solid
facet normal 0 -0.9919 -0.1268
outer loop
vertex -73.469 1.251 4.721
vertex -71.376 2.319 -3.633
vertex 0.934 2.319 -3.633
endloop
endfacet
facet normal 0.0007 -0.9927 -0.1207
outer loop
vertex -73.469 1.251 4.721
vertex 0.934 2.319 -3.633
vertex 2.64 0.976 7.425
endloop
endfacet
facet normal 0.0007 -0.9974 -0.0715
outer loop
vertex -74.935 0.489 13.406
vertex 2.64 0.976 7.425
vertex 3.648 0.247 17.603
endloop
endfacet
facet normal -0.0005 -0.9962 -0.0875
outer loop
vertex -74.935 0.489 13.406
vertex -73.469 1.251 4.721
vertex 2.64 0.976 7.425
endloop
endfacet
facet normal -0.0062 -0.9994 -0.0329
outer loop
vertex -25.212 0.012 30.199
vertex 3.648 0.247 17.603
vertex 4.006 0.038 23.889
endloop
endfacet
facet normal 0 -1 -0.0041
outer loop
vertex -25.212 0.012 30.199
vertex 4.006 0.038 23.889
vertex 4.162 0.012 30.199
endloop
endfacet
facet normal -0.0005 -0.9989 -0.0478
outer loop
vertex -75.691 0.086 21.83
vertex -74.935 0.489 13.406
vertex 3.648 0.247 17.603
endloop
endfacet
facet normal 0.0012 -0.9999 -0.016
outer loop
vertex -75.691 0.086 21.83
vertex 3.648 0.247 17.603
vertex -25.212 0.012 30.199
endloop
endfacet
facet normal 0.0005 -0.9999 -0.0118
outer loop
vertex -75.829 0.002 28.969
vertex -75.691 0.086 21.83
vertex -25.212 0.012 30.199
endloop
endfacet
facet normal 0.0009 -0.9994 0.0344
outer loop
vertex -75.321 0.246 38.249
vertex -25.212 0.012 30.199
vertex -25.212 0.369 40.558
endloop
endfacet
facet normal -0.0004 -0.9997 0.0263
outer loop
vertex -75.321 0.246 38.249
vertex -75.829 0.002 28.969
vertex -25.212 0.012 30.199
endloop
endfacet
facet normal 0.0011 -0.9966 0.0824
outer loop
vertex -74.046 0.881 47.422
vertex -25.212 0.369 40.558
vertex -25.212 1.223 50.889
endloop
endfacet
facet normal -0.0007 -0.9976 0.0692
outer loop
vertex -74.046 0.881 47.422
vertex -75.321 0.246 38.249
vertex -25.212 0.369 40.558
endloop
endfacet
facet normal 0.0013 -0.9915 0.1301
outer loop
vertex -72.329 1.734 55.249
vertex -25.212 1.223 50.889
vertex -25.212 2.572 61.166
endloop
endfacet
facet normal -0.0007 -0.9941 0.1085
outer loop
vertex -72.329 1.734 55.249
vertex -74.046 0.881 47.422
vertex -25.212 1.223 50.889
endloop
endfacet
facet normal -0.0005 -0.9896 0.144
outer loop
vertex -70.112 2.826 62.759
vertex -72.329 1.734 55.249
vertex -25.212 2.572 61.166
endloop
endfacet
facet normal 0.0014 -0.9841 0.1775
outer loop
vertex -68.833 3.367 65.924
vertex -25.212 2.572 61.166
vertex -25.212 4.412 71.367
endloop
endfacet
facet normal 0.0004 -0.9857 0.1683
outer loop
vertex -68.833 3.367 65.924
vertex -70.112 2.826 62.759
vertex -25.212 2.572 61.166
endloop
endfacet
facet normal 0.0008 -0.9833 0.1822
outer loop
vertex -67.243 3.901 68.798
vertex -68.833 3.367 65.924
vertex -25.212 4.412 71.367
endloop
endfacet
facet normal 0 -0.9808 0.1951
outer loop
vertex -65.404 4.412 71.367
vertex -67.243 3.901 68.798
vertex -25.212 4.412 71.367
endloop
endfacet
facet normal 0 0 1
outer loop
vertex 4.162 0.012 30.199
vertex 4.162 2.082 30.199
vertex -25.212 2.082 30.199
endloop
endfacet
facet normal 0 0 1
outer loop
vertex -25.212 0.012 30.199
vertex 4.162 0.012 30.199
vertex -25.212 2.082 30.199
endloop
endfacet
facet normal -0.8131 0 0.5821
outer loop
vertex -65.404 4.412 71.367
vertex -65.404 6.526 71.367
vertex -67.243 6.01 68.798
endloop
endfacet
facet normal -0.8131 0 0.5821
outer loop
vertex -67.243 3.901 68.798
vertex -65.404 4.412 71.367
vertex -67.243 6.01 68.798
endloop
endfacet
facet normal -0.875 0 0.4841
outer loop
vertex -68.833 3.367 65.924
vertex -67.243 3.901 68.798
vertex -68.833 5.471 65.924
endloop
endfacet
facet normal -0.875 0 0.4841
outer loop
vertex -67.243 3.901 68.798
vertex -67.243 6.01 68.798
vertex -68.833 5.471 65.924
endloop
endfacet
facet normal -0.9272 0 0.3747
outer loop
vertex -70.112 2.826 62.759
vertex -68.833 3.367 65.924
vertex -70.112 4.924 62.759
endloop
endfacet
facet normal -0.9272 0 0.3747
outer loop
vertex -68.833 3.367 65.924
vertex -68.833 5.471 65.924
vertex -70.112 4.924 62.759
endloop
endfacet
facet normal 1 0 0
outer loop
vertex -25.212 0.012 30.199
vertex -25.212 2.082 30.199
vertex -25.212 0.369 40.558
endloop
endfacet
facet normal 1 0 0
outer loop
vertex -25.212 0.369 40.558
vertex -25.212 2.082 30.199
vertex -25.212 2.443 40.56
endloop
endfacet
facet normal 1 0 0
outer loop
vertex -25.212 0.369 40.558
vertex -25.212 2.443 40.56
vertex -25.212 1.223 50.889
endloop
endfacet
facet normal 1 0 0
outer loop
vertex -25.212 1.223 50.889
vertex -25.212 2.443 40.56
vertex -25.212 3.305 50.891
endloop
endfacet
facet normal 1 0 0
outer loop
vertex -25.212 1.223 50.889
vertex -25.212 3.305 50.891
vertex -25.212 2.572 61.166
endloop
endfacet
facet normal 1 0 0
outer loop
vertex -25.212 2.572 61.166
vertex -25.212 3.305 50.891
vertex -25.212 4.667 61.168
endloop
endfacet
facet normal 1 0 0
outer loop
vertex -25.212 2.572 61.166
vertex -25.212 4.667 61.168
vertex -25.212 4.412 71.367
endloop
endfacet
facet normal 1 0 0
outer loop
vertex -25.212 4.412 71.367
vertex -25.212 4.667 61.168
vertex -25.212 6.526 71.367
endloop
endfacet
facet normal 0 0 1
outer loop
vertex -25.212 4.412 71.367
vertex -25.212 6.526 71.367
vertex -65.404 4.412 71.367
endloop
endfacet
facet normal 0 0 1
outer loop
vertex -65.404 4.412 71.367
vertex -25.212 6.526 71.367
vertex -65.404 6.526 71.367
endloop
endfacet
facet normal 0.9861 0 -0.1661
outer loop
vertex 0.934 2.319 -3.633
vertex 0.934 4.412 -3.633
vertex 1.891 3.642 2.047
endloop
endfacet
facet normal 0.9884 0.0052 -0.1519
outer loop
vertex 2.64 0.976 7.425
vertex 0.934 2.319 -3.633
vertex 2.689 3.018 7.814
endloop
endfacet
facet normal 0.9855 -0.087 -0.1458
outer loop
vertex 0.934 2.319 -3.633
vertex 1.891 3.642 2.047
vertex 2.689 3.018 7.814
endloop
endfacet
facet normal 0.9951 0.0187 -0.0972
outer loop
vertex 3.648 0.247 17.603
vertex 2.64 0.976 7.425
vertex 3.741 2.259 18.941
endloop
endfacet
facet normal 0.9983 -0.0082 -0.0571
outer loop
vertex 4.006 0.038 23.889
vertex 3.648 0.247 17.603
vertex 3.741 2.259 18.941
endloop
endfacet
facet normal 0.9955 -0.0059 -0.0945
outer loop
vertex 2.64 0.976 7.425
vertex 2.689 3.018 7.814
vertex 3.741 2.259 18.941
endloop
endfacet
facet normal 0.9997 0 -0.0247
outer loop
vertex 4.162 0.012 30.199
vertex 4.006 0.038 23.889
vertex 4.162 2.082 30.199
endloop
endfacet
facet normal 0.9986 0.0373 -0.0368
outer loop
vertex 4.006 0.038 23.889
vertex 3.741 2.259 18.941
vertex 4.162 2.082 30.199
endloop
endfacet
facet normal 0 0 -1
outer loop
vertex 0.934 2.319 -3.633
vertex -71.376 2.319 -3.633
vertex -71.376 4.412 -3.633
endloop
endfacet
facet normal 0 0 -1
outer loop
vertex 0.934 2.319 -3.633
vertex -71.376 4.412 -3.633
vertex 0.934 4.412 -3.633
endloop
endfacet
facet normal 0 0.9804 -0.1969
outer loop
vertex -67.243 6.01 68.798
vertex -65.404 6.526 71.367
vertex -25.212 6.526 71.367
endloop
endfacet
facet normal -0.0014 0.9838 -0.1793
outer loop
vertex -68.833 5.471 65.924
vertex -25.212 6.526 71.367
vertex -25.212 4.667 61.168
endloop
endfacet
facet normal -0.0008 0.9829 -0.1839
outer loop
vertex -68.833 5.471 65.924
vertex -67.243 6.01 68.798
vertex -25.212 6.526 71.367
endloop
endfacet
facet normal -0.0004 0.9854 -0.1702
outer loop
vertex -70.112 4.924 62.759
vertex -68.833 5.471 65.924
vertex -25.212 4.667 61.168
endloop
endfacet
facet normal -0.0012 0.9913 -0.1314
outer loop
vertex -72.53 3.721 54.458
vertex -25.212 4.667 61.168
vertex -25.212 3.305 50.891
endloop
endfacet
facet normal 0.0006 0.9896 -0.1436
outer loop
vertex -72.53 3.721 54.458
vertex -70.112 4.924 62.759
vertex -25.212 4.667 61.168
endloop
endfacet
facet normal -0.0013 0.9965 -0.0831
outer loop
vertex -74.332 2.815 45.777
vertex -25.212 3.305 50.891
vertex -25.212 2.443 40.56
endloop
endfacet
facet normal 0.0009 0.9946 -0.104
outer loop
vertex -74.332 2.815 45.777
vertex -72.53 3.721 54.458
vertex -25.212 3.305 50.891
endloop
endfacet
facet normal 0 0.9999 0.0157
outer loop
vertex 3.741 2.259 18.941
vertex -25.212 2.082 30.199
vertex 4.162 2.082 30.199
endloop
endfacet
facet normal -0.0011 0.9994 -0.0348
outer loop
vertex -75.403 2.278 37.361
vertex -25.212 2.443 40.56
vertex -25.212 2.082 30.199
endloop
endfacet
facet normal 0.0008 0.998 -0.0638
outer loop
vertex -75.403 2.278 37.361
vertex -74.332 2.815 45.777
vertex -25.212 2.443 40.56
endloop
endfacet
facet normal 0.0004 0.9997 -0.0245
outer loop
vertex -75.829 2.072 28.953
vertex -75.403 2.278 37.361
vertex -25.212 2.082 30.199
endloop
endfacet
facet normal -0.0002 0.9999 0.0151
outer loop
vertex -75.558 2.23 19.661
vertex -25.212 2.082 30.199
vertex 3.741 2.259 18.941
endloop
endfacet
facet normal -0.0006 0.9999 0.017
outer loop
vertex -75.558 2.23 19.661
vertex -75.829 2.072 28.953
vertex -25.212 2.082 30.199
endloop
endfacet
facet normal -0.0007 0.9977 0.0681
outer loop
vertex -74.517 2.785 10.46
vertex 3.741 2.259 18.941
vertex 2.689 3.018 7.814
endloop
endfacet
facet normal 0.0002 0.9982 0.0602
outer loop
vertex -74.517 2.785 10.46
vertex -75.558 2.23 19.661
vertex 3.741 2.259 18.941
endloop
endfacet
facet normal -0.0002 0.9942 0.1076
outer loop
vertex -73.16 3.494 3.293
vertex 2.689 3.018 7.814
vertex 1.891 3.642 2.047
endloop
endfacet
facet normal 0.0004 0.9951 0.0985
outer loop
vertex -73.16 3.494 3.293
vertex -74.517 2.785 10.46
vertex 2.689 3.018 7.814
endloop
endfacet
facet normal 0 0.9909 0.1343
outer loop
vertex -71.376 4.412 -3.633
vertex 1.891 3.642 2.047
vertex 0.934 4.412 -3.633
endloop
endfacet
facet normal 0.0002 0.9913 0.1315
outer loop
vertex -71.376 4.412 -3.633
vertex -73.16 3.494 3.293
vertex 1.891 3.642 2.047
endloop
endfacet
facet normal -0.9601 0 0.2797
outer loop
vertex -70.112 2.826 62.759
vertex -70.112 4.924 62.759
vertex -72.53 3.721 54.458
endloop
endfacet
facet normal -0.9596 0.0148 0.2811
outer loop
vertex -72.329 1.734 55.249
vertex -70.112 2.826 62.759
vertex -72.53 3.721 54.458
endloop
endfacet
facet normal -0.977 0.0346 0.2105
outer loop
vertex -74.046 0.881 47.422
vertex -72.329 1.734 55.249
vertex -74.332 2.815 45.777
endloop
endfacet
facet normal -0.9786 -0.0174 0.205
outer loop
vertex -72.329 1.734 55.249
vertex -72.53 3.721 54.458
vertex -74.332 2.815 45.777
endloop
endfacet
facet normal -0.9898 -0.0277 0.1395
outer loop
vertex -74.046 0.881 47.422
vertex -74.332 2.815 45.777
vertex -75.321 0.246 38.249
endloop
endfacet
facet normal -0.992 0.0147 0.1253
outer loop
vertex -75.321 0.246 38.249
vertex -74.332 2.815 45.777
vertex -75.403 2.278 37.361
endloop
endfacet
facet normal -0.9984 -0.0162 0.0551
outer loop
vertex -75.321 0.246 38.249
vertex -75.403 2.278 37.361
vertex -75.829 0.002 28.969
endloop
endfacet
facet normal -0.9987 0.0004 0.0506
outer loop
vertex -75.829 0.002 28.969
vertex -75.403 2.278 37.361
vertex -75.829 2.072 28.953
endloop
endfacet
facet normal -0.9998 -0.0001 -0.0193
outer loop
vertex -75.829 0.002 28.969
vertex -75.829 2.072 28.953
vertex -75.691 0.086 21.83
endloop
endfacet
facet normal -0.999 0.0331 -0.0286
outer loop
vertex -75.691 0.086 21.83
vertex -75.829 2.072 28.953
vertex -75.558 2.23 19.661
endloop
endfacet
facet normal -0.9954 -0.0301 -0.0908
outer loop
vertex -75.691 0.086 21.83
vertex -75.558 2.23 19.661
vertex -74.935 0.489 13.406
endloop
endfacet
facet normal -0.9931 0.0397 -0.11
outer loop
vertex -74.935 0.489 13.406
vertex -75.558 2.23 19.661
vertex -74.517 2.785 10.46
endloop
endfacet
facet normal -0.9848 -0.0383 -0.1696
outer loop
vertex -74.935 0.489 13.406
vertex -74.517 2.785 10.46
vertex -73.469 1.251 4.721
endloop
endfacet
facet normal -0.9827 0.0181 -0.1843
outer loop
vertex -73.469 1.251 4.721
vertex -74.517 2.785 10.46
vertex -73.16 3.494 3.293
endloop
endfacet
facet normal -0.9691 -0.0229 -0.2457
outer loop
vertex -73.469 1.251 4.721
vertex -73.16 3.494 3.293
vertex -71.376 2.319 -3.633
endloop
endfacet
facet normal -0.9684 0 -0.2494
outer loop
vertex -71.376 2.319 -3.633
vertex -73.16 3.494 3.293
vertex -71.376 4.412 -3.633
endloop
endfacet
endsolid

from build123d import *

# Parameters (mm, degrees)
SKETCH1_W               = 80
SKETCH1_H               = 75
BOSS_EXTRUDE1_DEPTH     = 30
CUT_EXTRUDE3_DEPTH      = 30
CUT_EXTRUDE4_DEPTH      = 46
CUT_EXTRUDE4_DEPTH_BACK = 53


with BuildPart() as part:
    # Sketch1 → Boss-Extrude1 (new body)
    with BuildSketch(Plane(origin=(0, 0, 0), x_dir=(1, 0, 0), z_dir=(0, 1, 0))):
        with Locations((-35.837742504, -33.866843034)):
            Rectangle(SKETCH1_W, SKETCH1_H)
    extrude(amount=BOSS_EXTRUDE1_DEPTH)

    # Sketch6 → Cut-Extrude3 (cut)
    with BuildSketch(Plane(origin=(0, 30, 0), x_dir=(1, 0, 0), z_dir=(0, 1, 0))):
        with BuildLine():
            Line((-71.375833468, 3.633156966), (-108.820806999, 13.42149107))
            Line((-108.820806999, 13.42149107), (-125.584570218, -100.370099881))
            Line((-125.584570218, -100.370099881), (-10.920024304, -107.668906036))
            Line((-10.920024304, -107.668906036), (16.042240316, -75.531910929))
            Line((16.042240316, -75.531910929), (16.042240316, -32.24724925))
            Line((16.042240316, -32.24724925), (13.170421527, 8.096312294))
            Line((13.170421527, 8.096312294), (0.934093701, 3.633156966))
            ThreePointArc((0.934093701, 3.633156966), (3.278926231, -13.213255463), (4.162257496, -30.199119503))
            Line((4.162257496, -30.199119503), (-25.2116582, -30.199119503))
            Line((-25.2116582, -30.199119503), (-25.2116582, -71.366843034))
            Line((-25.2116582, -71.366843034), (-65.403764634, -71.366843034))
            ThreePointArc((-65.403764634, -71.366843034), (-68.14206018, -67.273150859), (-70.111731546, -62.759064813))
            ThreePointArc((-70.111731546, -62.759064813), (-75.817600676, -29.659558964), (-71.375833468, 3.633156966))
        make_face()
    extrude(amount=-CUT_EXTRUDE3_DEPTH, mode=Mode.SUBTRACT)

    # Sketch7 → Cut-Extrude4 (cut, two sides: drawn at the far end of the back side and taken through both)
    with BuildSketch(Plane(origin=(-25.2116582, 0, 0), x_dir=(0, 0, -1), z_dir=(1, 0, 0)).offset(-CUT_EXTRUDE4_DEPTH_BACK)):
        with BuildLine():
            Line((3.633156966, 4.41216157), (25.866454997, 63.394578765))
            Line((25.866454997, 63.394578765), (-68.187233435, 84.334388308))
            Line((-68.187233435, 84.334388308), (-84.699418689, 46.854351889))
            Line((-84.699418689, 46.854351889), (-91.169251259, 32.168860137))
            Line((-91.169251259, 32.168860137), (-79.899921895, -15.478262788))
            Line((-79.899921895, -15.478262788), (10.487341479, -37.061233348))
            Line((10.487341479, -37.061233348), (3.633156966, 2.319452889))
            ThreePointArc((3.633156966, 2.319452889), (-33.958413843, 0.084026639), (-71.366843034, 4.41216157))
            Line((-71.366843034, 4.41216157), (-77.914841613, 5.869986833))
            Line((-77.914841613, 5.869986833), (-71.366843034, 6.525778375))
            ThreePointArc((-71.366843034, 6.525778375), (-33.960238488, 2.154907065), (3.633156966, 4.41216157))
        make_face()
    extrude(amount=CUT_EXTRUDE4_DEPTH + CUT_EXTRUDE4_DEPTH_BACK, mode=Mode.SUBTRACT)


solid = part.part
